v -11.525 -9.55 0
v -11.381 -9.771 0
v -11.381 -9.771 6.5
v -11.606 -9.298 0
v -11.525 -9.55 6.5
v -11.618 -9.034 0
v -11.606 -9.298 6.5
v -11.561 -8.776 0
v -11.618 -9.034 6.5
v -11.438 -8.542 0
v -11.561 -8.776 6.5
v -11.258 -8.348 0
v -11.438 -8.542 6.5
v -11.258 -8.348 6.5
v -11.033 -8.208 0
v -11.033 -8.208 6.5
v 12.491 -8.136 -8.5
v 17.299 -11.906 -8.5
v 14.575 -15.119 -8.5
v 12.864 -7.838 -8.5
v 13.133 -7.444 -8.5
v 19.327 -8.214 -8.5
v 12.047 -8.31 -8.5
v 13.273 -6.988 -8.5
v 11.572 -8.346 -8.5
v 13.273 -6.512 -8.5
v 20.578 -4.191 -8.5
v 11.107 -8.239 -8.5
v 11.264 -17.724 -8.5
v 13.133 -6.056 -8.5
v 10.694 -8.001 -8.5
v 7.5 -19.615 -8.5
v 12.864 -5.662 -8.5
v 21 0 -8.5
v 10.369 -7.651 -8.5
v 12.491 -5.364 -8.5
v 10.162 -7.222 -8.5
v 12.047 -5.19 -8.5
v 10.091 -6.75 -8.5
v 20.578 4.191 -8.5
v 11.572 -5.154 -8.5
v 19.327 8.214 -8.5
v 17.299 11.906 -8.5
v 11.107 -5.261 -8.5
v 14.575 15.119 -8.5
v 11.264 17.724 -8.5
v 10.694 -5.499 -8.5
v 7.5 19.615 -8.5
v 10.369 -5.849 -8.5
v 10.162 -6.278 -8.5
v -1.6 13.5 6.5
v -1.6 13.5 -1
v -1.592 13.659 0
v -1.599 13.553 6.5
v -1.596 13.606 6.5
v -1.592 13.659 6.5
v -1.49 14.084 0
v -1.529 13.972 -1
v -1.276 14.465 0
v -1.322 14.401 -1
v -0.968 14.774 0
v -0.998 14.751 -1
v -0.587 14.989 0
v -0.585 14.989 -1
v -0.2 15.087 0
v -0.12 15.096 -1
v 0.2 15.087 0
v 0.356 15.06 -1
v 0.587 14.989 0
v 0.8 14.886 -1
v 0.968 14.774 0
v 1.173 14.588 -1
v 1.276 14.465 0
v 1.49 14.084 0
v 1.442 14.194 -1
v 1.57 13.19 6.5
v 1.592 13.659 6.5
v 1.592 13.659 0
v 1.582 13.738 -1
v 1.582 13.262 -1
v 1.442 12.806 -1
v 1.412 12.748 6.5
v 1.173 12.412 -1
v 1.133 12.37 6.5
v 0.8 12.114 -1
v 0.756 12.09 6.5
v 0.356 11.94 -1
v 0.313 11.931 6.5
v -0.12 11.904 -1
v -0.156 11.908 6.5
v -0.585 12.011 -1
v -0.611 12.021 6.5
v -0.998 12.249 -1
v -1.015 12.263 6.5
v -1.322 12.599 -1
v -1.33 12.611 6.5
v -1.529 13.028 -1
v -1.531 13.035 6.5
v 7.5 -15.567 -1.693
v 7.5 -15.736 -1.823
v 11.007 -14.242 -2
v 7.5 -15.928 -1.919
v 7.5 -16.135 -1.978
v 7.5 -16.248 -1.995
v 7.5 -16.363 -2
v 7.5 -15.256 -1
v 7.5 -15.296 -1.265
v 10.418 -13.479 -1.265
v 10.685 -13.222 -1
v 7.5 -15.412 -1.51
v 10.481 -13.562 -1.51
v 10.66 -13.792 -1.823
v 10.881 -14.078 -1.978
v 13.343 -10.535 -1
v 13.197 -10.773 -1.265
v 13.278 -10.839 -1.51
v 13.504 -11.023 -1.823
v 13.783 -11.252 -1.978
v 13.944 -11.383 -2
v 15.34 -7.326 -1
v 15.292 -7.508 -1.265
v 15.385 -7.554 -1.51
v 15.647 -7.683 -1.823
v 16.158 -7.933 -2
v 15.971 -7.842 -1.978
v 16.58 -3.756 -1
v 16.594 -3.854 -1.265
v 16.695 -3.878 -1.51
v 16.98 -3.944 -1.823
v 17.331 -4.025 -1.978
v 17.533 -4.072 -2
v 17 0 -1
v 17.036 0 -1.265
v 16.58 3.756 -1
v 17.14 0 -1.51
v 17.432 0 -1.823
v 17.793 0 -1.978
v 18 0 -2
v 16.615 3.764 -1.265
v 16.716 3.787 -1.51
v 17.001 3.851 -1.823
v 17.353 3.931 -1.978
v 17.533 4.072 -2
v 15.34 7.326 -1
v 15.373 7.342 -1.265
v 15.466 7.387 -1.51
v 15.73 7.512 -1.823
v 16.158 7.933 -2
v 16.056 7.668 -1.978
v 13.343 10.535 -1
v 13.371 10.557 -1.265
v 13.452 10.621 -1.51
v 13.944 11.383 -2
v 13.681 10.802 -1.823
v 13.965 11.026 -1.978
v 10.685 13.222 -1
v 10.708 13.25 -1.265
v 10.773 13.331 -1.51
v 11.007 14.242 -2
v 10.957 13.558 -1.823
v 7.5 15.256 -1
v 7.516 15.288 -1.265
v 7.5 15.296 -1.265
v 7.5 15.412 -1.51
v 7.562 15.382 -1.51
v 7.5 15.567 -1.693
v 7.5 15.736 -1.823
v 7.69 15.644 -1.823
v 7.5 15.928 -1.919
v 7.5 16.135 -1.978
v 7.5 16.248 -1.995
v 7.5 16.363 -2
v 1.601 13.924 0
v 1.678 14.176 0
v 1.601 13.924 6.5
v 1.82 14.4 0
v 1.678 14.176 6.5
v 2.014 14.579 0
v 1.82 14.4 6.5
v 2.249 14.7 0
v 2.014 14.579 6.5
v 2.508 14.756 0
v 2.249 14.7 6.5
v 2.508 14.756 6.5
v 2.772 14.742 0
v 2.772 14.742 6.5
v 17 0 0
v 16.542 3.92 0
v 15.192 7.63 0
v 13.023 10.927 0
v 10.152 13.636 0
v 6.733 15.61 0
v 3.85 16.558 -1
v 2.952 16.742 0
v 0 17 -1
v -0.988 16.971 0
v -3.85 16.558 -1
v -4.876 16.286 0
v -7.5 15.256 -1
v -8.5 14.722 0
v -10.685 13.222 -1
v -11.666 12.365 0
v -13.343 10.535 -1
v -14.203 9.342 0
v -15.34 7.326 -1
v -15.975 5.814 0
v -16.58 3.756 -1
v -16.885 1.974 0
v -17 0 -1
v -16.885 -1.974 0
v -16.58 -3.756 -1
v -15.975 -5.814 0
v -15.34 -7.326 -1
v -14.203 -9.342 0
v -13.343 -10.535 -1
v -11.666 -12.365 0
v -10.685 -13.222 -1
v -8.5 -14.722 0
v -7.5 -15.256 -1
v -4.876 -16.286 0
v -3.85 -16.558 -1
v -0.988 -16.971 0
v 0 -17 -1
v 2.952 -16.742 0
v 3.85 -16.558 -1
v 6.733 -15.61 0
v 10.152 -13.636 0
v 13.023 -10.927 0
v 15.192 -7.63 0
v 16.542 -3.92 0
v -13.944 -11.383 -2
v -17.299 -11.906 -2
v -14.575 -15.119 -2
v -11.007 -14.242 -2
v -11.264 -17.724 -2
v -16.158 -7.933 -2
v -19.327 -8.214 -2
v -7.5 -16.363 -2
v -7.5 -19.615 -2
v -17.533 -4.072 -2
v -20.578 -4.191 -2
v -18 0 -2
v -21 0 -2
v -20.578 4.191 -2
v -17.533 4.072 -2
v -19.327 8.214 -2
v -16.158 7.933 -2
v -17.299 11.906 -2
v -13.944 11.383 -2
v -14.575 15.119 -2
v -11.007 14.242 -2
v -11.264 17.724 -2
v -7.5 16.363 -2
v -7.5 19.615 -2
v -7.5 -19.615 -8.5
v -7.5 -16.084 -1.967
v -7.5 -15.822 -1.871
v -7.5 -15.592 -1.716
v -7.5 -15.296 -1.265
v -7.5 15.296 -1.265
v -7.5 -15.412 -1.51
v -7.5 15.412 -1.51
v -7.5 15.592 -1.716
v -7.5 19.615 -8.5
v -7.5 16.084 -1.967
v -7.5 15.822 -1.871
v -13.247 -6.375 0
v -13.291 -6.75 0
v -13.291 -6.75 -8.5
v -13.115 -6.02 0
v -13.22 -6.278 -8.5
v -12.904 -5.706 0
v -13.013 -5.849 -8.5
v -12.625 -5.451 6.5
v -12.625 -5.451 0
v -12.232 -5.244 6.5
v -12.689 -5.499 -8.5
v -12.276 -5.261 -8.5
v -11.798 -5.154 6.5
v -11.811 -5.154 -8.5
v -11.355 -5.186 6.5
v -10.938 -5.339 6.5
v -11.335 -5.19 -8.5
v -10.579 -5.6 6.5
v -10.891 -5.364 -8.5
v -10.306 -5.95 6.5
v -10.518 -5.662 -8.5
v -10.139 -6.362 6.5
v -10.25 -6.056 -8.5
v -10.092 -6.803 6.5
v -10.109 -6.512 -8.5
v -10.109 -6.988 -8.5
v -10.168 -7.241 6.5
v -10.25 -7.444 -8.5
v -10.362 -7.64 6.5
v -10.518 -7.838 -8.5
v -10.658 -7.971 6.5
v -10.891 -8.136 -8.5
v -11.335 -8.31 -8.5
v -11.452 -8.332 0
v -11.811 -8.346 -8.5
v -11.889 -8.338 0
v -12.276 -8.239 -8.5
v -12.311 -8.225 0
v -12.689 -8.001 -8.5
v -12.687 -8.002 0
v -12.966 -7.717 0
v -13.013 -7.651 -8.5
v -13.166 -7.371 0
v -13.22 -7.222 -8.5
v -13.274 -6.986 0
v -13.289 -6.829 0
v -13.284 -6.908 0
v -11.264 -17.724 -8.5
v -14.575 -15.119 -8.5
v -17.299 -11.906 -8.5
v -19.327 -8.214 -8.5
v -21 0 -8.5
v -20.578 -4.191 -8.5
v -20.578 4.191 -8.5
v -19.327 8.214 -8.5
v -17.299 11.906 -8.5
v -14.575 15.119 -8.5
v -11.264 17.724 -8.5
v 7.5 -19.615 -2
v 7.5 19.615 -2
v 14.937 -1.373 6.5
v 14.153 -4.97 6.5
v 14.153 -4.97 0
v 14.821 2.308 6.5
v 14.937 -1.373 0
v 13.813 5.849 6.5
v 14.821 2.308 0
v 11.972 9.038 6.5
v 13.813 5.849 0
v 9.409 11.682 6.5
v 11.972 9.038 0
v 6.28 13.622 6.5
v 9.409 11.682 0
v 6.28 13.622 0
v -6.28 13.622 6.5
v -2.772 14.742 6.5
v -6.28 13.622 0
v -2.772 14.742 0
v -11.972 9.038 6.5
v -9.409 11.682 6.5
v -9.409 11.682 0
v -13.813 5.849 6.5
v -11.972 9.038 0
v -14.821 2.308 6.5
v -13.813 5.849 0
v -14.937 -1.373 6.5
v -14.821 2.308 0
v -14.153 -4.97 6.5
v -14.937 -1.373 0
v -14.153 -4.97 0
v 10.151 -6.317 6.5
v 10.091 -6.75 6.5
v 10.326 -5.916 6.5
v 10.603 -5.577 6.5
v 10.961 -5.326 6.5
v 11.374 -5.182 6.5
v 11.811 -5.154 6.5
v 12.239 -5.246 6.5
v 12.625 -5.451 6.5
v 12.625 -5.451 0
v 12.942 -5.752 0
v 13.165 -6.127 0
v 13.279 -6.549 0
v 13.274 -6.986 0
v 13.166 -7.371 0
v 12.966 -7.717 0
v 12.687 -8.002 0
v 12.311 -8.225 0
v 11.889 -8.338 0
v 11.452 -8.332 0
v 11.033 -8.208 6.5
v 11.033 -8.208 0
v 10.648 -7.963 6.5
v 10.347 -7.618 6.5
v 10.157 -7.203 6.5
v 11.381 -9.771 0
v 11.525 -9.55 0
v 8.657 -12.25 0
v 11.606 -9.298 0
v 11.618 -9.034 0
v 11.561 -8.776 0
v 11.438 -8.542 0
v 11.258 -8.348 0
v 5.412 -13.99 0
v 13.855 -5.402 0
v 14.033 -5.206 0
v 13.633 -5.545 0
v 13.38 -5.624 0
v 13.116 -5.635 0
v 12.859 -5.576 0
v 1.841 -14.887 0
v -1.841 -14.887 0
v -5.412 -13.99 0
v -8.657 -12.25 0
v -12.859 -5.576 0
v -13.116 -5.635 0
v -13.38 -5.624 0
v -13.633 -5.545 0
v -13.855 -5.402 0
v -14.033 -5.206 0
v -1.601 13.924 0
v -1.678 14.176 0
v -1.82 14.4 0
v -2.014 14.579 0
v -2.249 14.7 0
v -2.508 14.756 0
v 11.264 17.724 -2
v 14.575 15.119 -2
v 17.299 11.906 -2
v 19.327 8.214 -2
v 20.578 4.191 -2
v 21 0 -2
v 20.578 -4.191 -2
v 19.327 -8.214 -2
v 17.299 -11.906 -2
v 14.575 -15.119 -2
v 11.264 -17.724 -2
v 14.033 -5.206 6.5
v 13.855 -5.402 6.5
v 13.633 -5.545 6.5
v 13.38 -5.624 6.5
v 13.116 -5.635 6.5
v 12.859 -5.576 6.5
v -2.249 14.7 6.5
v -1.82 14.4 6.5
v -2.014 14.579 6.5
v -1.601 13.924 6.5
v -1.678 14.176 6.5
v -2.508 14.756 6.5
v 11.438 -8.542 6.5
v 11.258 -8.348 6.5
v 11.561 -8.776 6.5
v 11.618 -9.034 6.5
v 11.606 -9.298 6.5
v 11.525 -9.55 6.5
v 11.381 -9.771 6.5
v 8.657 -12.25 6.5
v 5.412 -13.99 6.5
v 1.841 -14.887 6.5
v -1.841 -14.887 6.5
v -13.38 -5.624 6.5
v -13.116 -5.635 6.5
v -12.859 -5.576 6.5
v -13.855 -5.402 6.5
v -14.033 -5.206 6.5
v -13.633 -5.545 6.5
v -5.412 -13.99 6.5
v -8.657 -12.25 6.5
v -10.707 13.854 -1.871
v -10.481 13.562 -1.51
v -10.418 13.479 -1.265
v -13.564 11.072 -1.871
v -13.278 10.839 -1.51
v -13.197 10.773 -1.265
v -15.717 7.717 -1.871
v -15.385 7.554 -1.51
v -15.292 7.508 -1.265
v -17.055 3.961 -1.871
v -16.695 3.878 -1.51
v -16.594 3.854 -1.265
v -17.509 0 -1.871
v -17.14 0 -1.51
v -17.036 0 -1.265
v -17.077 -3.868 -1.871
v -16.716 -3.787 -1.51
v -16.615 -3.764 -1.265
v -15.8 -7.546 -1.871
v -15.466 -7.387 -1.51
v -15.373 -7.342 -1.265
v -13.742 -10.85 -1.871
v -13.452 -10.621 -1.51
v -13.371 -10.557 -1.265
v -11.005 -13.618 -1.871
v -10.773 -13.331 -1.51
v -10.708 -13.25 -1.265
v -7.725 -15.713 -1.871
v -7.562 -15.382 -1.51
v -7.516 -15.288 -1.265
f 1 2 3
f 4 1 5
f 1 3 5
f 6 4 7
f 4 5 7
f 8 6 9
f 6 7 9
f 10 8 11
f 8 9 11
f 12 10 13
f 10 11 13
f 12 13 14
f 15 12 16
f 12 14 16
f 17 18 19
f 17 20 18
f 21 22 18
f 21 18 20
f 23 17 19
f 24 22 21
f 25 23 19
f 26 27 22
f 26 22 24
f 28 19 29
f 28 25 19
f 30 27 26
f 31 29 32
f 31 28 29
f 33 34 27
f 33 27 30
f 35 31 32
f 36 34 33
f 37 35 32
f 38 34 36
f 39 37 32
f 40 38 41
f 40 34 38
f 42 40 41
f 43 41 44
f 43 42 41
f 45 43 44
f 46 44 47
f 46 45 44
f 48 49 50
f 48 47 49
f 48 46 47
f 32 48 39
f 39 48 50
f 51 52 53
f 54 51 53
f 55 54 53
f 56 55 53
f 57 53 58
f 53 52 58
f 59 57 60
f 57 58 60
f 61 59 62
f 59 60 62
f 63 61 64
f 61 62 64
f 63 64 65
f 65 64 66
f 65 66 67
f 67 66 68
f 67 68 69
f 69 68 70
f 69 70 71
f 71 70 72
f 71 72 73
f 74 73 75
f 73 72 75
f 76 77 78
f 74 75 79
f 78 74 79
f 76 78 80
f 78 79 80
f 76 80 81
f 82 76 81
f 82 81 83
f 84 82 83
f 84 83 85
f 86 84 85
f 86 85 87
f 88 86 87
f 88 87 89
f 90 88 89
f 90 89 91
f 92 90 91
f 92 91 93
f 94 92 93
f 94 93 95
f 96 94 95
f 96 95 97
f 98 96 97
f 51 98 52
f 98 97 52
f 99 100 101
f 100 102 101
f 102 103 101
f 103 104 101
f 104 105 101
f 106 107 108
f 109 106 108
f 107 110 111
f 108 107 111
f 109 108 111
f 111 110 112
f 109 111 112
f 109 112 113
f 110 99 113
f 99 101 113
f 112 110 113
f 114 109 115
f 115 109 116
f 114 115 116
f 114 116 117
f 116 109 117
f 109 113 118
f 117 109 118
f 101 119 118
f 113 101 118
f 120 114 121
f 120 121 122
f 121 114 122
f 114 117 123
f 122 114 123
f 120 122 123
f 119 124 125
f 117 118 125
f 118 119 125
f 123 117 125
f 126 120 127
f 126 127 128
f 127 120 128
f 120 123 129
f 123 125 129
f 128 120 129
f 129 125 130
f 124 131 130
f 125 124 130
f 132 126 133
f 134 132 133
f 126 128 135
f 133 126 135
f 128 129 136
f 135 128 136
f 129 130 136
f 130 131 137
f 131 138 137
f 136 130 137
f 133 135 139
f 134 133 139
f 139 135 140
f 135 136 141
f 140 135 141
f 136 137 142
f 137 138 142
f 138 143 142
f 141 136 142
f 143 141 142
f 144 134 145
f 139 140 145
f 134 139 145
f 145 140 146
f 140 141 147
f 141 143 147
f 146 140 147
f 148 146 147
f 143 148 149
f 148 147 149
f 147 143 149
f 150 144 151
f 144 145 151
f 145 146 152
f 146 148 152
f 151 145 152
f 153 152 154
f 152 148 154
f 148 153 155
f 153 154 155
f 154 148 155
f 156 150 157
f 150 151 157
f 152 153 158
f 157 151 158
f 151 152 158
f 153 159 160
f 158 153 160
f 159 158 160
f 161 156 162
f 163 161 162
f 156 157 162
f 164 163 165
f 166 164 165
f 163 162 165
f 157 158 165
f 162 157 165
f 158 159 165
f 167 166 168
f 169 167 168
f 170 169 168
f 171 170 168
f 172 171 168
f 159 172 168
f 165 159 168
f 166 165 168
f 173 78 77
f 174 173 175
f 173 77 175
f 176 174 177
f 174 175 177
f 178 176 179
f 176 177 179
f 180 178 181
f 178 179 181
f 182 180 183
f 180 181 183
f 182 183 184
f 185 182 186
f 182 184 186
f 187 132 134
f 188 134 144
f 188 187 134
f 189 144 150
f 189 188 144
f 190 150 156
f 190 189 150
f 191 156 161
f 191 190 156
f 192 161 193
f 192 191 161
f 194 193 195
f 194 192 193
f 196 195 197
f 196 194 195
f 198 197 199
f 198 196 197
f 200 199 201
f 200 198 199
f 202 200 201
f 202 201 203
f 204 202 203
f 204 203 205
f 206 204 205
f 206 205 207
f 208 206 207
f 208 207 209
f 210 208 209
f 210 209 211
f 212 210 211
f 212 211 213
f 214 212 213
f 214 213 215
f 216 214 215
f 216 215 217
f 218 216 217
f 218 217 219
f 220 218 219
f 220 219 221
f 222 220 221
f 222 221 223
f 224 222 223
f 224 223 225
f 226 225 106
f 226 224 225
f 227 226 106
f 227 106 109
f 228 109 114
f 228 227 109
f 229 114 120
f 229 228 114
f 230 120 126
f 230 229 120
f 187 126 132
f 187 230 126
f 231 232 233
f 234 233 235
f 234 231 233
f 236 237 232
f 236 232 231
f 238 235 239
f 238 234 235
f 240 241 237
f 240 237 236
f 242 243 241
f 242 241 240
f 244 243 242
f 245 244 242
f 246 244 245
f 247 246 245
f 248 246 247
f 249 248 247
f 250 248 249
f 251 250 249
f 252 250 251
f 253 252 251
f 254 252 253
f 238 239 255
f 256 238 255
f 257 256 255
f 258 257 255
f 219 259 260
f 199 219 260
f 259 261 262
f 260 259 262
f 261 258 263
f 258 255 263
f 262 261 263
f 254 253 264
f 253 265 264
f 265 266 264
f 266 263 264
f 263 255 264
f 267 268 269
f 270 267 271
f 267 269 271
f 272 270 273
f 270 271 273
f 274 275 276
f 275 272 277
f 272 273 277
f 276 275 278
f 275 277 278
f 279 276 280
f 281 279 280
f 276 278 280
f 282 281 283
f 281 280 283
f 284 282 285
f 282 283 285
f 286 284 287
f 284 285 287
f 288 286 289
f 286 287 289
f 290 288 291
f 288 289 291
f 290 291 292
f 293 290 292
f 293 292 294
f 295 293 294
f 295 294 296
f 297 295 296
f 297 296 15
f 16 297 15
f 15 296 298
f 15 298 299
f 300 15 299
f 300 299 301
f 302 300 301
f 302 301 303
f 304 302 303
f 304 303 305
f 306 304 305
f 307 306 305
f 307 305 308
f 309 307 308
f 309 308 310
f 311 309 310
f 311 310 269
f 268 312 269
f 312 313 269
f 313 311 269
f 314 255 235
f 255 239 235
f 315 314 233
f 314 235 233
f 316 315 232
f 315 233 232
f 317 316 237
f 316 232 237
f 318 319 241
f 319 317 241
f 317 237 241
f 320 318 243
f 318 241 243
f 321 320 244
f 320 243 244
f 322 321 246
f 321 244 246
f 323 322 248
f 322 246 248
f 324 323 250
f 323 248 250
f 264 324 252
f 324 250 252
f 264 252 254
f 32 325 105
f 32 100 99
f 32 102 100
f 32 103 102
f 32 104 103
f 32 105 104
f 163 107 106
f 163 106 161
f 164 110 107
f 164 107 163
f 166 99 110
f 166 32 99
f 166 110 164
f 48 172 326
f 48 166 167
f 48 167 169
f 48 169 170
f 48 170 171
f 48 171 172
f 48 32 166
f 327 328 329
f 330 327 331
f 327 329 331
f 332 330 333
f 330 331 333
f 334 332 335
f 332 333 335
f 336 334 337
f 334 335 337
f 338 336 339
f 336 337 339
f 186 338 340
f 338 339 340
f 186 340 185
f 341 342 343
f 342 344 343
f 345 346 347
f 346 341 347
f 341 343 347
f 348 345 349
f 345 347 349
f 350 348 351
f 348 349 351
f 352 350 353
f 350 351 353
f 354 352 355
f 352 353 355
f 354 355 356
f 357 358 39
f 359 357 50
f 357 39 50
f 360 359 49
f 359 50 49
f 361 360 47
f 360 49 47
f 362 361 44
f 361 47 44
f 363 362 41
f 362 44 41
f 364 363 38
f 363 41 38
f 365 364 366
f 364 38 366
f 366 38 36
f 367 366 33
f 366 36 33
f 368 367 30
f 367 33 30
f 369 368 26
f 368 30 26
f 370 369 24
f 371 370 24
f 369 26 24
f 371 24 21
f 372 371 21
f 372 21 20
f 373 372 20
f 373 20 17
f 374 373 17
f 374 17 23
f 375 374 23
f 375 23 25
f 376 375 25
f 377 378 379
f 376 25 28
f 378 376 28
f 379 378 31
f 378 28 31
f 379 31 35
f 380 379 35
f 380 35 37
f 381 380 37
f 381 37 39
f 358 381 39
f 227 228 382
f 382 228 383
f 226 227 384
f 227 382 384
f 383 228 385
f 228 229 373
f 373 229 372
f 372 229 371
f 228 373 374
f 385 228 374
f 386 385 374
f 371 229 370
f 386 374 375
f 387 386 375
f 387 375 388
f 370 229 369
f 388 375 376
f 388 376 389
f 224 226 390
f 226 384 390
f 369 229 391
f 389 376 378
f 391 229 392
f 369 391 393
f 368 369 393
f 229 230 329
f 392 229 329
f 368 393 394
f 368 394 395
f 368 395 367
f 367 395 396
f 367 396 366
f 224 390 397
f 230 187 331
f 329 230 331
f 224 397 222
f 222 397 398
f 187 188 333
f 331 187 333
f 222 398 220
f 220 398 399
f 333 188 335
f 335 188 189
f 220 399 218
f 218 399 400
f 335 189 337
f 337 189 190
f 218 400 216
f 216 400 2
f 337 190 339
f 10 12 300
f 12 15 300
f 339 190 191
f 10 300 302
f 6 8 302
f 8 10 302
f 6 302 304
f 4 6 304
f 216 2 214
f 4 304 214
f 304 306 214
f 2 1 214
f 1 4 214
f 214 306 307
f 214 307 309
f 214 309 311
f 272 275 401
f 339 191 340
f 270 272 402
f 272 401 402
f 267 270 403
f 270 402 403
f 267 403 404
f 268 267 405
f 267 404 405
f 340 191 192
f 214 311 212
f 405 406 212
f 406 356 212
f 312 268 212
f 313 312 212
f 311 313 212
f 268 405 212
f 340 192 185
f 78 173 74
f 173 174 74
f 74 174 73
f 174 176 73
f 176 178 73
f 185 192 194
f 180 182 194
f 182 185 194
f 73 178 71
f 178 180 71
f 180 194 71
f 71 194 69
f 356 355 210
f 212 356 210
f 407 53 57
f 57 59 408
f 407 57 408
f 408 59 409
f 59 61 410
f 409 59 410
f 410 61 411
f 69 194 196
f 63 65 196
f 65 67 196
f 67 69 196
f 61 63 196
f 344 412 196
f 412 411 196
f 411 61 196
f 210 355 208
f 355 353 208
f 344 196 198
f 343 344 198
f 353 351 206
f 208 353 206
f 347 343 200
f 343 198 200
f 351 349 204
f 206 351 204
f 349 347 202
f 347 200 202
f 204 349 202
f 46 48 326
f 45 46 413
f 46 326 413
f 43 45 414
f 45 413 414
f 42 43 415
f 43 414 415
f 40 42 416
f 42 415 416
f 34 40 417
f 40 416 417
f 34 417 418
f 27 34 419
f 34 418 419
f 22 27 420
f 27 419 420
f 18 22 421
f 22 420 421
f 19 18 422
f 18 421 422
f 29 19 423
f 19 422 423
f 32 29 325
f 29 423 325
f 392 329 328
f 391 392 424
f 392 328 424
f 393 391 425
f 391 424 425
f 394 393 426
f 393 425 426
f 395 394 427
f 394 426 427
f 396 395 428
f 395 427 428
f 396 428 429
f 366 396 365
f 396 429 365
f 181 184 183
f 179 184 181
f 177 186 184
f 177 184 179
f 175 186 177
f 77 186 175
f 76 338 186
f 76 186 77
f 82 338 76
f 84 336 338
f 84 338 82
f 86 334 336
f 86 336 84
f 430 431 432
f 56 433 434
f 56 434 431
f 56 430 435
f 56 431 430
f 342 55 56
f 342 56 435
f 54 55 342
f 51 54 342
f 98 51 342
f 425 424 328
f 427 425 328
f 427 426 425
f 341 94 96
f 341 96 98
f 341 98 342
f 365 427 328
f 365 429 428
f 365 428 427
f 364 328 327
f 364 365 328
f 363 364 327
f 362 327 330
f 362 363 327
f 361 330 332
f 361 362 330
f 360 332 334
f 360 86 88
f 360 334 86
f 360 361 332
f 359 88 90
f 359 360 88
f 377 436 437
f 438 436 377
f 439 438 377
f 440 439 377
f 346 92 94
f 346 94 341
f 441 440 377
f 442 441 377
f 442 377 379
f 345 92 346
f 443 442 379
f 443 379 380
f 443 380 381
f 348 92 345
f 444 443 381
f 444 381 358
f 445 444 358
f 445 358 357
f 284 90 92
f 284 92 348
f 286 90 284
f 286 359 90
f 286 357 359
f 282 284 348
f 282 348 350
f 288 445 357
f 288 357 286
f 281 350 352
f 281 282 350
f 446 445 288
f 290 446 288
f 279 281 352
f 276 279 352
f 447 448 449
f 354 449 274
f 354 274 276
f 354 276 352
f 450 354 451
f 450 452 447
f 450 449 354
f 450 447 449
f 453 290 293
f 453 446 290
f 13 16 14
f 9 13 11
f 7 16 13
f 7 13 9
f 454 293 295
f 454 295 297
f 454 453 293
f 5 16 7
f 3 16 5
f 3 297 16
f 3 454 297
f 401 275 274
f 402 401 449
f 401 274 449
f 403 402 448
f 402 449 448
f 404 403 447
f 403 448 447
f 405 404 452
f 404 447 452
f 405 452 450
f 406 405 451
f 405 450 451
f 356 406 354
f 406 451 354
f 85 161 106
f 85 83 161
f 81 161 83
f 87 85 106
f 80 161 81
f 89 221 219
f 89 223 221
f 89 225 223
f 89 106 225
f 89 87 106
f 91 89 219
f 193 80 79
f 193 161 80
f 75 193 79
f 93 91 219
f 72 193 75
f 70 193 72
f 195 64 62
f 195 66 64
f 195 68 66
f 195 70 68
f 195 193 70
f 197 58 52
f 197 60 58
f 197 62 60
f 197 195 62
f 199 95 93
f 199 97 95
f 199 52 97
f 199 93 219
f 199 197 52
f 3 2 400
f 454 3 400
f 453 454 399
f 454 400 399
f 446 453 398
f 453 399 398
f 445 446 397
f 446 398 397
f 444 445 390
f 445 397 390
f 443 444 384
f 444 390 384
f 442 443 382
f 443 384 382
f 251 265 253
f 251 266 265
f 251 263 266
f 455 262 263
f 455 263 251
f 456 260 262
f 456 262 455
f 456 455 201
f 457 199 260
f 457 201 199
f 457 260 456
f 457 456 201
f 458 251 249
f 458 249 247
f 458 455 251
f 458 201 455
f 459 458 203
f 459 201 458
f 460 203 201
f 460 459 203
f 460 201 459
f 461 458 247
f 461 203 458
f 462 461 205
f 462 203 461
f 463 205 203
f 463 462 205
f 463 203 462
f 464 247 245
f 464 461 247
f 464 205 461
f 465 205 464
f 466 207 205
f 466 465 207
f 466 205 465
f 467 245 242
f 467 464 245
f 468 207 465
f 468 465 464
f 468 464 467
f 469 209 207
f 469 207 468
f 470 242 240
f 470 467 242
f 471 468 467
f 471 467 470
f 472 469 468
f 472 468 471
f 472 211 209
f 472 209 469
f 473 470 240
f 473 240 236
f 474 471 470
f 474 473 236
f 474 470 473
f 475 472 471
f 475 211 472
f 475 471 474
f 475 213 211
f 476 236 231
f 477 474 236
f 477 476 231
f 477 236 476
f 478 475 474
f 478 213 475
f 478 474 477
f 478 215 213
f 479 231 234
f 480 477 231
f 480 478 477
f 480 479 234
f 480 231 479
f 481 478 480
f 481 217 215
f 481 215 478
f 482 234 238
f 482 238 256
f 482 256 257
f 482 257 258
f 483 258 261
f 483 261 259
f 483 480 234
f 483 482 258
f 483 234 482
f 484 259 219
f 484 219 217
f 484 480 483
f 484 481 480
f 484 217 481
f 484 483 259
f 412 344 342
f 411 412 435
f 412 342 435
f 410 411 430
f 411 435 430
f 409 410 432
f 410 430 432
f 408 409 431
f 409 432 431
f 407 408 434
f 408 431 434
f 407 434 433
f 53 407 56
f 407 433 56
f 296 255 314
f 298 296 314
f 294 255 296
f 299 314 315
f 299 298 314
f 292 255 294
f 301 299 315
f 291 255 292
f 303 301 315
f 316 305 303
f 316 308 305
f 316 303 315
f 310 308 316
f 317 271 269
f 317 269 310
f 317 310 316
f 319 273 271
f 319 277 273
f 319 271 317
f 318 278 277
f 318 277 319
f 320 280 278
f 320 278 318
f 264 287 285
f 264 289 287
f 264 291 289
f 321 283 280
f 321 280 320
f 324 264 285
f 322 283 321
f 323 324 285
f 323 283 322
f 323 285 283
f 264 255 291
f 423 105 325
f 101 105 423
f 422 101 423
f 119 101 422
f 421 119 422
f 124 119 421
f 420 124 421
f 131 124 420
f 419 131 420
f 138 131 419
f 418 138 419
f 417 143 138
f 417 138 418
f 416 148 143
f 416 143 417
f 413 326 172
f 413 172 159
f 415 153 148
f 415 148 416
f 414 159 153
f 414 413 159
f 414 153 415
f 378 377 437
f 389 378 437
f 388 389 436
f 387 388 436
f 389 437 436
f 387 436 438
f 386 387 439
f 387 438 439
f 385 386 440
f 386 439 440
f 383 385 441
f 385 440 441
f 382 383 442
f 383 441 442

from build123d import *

# Parameters (mm, degrees)
SKETCH_1_R          = 15
EXTRUDE_1_DEPTH     = 6.5
SKETCH_2_R          = 21
EXTRUDE_2_DEPTH     = 8.5
SKETCH_3_R          = 1.6
CUT_EXTRUDE_1_DEPTH = 26.5
SKETCH_6_W          = 15
SKETCH_6_H          = 50
CUT_EXTRUDE_3_DEPTH = 7.5
FILLET_1_R          = 1
SKETCH_7_R          = 21
SKETCH_7_R_2        = 17
CUT_EXTRUDE_4_DEPTH = 2
FILLET_2_R          = 1


with BuildPart() as part:
    # 草图1 → 凸台-拉伸1 (new body)
    with BuildSketch(Plane.XY):
        with Locations(Location((0, 0, 0), (0, 0, 180))):
            Circle(SKETCH_1_R)
    extrude(amount=EXTRUDE_1_DEPTH)

    # 草图2 → 凸台-拉伸2 (add)
    with BuildSketch(Plane(origin=(0, 0, 0), x_dir=(-1, 0, 0), z_dir=(0, 0, -1))):
        Circle(SKETCH_2_R)
    extrude(amount=EXTRUDE_2_DEPTH)

    # 草图3 → 切除-拉伸1 (cut)
    with BuildSketch(Plane(origin=(0, 0, -8.5), x_dir=(-1, 0, 0), z_dir=(0, 0, -1))):
        with Locations((0, 13.5)):
            Circle(SKETCH_3_R)
        with Locations((11.691342951, -6.75)):
            Circle(SKETCH_3_R)
        with Locations((-11.691342951, -6.75)):
            Circle(SKETCH_3_R)
    extrude(amount=-CUT_EXTRUDE_1_DEPTH, mode=Mode.SUBTRACT)

    # 草图6 → 切除-拉伸3 (cut)
    with BuildSketch(Plane(origin=(0, 0, -8.5), x_dir=(-1, 0, 0), z_dir=(0, 0, -1))):
        Rectangle(SKETCH_6_W, SKETCH_6_H)
    extrude(amount=-CUT_EXTRUDE_3_DEPTH, mode=Mode.SUBTRACT)

    # 圆角1
    # the kernel refuses this fillet: 1 mm, written as the material it takes off along each edge
    with BuildSketch(Plane(origin=(-0.586781578, 14.988518519, 11.997469711), x_dir=(-0.6032076462892466, -0.7975841870662852, 0), z_dir=(0, 0, -1)), Plane(origin=(-12.687047013, -8.002427012, 11.997469711), x_dir=(0.9923319908008487, -0.1236010519098617, 0), z_dir=(0, 0, -1)), Plane(origin=(13.273828591, -6.986091506, 11.997469711), x_dir=(-0.38912434451096145, 0.9211852389768925, 0), z_dir=(0, 0, -1))) as fillet_1_piece_1:
        with BuildLine():
            CenterArc((2.187327708, 0.853683412), FILLET_1_R, 132.251057191, 106.363529617)
            ThreePointArc((1.514947242, 1.593889134), (0.728226426, 0.824743212), (0, 0))
            ThreePointArc((0, 0), (0.833267698, 0.23410654), (1.666535396, 0))
        make_face()
    extrude(amount=11.997469711, mode=Mode.SUBTRACT)
    with BuildSketch(Plane(origin=(0.586781578, 14.988518519, 11.997469711), x_dir=(0.6032076462892473, -0.7975841870662848, 0), z_dir=(0, 0, -1))) as fillet_1_piece_2:
        with BuildLine():
            CenterArc((2.187327708, -0.853683412), FILLET_1_R, 121.385413192, 106.363529617)
            ThreePointArc((1.514947242, -1.593889134), (0.728226426, -0.824743212), (0, 0))
            ThreePointArc((0, 0), (0.833267698, -0.23410654), (1.666535396, 0))
        make_face()
    extrude(amount=11.997469711, mode=Mode.SUBTRACT)
    with BuildSketch(Plane(origin=(-13.273828591, -6.986091506, 11.997469711), x_dir=(-0.3996221607245731, 0.9166799488686461, 0), z_dir=(0, 0, -1)), Plane(origin=(12.687047013, -8.002427012, 11.997469711), x_dir=(-0.594057042497704, -0.8044229175370883, 0), z_dir=(0, 0, -1))) as fillet_1_piece_3:
        with BuildLine():
            CenterArc((2.125688288, 0.997309966), FILLET_1_R, 167.839997769, 106.363529617)
            ThreePointArc((1.148125108, 1.207952385), (0.743749651, 0.442693331), (0, 0))
            ThreePointArc((0, 0), (1.099493942, -0.040350503), (2.198987885, 0))
        make_face()
    extrude(amount=11.997469711, mode=Mode.SUBTRACT)

    # 草图7 → 切除-拉伸4 (cut)
    with BuildSketch(Plane.XY):
        Circle(SKETCH_7_R)
        Circle(SKETCH_7_R_2, mode=Mode.SUBTRACT)
    extrude(amount=-CUT_EXTRUDE_4_DEPTH, mode=Mode.SUBTRACT)

    # 圆角2
    fillet_2_edges = [part.edges().sort_by_distance(p)[0] for p in [
        (-17, 0, -2),
        (14.43086969, -8.986100378, -2),
    ]]
    fillet(fillet_2_edges, radius=FILLET_2_R)


solid = part.part
